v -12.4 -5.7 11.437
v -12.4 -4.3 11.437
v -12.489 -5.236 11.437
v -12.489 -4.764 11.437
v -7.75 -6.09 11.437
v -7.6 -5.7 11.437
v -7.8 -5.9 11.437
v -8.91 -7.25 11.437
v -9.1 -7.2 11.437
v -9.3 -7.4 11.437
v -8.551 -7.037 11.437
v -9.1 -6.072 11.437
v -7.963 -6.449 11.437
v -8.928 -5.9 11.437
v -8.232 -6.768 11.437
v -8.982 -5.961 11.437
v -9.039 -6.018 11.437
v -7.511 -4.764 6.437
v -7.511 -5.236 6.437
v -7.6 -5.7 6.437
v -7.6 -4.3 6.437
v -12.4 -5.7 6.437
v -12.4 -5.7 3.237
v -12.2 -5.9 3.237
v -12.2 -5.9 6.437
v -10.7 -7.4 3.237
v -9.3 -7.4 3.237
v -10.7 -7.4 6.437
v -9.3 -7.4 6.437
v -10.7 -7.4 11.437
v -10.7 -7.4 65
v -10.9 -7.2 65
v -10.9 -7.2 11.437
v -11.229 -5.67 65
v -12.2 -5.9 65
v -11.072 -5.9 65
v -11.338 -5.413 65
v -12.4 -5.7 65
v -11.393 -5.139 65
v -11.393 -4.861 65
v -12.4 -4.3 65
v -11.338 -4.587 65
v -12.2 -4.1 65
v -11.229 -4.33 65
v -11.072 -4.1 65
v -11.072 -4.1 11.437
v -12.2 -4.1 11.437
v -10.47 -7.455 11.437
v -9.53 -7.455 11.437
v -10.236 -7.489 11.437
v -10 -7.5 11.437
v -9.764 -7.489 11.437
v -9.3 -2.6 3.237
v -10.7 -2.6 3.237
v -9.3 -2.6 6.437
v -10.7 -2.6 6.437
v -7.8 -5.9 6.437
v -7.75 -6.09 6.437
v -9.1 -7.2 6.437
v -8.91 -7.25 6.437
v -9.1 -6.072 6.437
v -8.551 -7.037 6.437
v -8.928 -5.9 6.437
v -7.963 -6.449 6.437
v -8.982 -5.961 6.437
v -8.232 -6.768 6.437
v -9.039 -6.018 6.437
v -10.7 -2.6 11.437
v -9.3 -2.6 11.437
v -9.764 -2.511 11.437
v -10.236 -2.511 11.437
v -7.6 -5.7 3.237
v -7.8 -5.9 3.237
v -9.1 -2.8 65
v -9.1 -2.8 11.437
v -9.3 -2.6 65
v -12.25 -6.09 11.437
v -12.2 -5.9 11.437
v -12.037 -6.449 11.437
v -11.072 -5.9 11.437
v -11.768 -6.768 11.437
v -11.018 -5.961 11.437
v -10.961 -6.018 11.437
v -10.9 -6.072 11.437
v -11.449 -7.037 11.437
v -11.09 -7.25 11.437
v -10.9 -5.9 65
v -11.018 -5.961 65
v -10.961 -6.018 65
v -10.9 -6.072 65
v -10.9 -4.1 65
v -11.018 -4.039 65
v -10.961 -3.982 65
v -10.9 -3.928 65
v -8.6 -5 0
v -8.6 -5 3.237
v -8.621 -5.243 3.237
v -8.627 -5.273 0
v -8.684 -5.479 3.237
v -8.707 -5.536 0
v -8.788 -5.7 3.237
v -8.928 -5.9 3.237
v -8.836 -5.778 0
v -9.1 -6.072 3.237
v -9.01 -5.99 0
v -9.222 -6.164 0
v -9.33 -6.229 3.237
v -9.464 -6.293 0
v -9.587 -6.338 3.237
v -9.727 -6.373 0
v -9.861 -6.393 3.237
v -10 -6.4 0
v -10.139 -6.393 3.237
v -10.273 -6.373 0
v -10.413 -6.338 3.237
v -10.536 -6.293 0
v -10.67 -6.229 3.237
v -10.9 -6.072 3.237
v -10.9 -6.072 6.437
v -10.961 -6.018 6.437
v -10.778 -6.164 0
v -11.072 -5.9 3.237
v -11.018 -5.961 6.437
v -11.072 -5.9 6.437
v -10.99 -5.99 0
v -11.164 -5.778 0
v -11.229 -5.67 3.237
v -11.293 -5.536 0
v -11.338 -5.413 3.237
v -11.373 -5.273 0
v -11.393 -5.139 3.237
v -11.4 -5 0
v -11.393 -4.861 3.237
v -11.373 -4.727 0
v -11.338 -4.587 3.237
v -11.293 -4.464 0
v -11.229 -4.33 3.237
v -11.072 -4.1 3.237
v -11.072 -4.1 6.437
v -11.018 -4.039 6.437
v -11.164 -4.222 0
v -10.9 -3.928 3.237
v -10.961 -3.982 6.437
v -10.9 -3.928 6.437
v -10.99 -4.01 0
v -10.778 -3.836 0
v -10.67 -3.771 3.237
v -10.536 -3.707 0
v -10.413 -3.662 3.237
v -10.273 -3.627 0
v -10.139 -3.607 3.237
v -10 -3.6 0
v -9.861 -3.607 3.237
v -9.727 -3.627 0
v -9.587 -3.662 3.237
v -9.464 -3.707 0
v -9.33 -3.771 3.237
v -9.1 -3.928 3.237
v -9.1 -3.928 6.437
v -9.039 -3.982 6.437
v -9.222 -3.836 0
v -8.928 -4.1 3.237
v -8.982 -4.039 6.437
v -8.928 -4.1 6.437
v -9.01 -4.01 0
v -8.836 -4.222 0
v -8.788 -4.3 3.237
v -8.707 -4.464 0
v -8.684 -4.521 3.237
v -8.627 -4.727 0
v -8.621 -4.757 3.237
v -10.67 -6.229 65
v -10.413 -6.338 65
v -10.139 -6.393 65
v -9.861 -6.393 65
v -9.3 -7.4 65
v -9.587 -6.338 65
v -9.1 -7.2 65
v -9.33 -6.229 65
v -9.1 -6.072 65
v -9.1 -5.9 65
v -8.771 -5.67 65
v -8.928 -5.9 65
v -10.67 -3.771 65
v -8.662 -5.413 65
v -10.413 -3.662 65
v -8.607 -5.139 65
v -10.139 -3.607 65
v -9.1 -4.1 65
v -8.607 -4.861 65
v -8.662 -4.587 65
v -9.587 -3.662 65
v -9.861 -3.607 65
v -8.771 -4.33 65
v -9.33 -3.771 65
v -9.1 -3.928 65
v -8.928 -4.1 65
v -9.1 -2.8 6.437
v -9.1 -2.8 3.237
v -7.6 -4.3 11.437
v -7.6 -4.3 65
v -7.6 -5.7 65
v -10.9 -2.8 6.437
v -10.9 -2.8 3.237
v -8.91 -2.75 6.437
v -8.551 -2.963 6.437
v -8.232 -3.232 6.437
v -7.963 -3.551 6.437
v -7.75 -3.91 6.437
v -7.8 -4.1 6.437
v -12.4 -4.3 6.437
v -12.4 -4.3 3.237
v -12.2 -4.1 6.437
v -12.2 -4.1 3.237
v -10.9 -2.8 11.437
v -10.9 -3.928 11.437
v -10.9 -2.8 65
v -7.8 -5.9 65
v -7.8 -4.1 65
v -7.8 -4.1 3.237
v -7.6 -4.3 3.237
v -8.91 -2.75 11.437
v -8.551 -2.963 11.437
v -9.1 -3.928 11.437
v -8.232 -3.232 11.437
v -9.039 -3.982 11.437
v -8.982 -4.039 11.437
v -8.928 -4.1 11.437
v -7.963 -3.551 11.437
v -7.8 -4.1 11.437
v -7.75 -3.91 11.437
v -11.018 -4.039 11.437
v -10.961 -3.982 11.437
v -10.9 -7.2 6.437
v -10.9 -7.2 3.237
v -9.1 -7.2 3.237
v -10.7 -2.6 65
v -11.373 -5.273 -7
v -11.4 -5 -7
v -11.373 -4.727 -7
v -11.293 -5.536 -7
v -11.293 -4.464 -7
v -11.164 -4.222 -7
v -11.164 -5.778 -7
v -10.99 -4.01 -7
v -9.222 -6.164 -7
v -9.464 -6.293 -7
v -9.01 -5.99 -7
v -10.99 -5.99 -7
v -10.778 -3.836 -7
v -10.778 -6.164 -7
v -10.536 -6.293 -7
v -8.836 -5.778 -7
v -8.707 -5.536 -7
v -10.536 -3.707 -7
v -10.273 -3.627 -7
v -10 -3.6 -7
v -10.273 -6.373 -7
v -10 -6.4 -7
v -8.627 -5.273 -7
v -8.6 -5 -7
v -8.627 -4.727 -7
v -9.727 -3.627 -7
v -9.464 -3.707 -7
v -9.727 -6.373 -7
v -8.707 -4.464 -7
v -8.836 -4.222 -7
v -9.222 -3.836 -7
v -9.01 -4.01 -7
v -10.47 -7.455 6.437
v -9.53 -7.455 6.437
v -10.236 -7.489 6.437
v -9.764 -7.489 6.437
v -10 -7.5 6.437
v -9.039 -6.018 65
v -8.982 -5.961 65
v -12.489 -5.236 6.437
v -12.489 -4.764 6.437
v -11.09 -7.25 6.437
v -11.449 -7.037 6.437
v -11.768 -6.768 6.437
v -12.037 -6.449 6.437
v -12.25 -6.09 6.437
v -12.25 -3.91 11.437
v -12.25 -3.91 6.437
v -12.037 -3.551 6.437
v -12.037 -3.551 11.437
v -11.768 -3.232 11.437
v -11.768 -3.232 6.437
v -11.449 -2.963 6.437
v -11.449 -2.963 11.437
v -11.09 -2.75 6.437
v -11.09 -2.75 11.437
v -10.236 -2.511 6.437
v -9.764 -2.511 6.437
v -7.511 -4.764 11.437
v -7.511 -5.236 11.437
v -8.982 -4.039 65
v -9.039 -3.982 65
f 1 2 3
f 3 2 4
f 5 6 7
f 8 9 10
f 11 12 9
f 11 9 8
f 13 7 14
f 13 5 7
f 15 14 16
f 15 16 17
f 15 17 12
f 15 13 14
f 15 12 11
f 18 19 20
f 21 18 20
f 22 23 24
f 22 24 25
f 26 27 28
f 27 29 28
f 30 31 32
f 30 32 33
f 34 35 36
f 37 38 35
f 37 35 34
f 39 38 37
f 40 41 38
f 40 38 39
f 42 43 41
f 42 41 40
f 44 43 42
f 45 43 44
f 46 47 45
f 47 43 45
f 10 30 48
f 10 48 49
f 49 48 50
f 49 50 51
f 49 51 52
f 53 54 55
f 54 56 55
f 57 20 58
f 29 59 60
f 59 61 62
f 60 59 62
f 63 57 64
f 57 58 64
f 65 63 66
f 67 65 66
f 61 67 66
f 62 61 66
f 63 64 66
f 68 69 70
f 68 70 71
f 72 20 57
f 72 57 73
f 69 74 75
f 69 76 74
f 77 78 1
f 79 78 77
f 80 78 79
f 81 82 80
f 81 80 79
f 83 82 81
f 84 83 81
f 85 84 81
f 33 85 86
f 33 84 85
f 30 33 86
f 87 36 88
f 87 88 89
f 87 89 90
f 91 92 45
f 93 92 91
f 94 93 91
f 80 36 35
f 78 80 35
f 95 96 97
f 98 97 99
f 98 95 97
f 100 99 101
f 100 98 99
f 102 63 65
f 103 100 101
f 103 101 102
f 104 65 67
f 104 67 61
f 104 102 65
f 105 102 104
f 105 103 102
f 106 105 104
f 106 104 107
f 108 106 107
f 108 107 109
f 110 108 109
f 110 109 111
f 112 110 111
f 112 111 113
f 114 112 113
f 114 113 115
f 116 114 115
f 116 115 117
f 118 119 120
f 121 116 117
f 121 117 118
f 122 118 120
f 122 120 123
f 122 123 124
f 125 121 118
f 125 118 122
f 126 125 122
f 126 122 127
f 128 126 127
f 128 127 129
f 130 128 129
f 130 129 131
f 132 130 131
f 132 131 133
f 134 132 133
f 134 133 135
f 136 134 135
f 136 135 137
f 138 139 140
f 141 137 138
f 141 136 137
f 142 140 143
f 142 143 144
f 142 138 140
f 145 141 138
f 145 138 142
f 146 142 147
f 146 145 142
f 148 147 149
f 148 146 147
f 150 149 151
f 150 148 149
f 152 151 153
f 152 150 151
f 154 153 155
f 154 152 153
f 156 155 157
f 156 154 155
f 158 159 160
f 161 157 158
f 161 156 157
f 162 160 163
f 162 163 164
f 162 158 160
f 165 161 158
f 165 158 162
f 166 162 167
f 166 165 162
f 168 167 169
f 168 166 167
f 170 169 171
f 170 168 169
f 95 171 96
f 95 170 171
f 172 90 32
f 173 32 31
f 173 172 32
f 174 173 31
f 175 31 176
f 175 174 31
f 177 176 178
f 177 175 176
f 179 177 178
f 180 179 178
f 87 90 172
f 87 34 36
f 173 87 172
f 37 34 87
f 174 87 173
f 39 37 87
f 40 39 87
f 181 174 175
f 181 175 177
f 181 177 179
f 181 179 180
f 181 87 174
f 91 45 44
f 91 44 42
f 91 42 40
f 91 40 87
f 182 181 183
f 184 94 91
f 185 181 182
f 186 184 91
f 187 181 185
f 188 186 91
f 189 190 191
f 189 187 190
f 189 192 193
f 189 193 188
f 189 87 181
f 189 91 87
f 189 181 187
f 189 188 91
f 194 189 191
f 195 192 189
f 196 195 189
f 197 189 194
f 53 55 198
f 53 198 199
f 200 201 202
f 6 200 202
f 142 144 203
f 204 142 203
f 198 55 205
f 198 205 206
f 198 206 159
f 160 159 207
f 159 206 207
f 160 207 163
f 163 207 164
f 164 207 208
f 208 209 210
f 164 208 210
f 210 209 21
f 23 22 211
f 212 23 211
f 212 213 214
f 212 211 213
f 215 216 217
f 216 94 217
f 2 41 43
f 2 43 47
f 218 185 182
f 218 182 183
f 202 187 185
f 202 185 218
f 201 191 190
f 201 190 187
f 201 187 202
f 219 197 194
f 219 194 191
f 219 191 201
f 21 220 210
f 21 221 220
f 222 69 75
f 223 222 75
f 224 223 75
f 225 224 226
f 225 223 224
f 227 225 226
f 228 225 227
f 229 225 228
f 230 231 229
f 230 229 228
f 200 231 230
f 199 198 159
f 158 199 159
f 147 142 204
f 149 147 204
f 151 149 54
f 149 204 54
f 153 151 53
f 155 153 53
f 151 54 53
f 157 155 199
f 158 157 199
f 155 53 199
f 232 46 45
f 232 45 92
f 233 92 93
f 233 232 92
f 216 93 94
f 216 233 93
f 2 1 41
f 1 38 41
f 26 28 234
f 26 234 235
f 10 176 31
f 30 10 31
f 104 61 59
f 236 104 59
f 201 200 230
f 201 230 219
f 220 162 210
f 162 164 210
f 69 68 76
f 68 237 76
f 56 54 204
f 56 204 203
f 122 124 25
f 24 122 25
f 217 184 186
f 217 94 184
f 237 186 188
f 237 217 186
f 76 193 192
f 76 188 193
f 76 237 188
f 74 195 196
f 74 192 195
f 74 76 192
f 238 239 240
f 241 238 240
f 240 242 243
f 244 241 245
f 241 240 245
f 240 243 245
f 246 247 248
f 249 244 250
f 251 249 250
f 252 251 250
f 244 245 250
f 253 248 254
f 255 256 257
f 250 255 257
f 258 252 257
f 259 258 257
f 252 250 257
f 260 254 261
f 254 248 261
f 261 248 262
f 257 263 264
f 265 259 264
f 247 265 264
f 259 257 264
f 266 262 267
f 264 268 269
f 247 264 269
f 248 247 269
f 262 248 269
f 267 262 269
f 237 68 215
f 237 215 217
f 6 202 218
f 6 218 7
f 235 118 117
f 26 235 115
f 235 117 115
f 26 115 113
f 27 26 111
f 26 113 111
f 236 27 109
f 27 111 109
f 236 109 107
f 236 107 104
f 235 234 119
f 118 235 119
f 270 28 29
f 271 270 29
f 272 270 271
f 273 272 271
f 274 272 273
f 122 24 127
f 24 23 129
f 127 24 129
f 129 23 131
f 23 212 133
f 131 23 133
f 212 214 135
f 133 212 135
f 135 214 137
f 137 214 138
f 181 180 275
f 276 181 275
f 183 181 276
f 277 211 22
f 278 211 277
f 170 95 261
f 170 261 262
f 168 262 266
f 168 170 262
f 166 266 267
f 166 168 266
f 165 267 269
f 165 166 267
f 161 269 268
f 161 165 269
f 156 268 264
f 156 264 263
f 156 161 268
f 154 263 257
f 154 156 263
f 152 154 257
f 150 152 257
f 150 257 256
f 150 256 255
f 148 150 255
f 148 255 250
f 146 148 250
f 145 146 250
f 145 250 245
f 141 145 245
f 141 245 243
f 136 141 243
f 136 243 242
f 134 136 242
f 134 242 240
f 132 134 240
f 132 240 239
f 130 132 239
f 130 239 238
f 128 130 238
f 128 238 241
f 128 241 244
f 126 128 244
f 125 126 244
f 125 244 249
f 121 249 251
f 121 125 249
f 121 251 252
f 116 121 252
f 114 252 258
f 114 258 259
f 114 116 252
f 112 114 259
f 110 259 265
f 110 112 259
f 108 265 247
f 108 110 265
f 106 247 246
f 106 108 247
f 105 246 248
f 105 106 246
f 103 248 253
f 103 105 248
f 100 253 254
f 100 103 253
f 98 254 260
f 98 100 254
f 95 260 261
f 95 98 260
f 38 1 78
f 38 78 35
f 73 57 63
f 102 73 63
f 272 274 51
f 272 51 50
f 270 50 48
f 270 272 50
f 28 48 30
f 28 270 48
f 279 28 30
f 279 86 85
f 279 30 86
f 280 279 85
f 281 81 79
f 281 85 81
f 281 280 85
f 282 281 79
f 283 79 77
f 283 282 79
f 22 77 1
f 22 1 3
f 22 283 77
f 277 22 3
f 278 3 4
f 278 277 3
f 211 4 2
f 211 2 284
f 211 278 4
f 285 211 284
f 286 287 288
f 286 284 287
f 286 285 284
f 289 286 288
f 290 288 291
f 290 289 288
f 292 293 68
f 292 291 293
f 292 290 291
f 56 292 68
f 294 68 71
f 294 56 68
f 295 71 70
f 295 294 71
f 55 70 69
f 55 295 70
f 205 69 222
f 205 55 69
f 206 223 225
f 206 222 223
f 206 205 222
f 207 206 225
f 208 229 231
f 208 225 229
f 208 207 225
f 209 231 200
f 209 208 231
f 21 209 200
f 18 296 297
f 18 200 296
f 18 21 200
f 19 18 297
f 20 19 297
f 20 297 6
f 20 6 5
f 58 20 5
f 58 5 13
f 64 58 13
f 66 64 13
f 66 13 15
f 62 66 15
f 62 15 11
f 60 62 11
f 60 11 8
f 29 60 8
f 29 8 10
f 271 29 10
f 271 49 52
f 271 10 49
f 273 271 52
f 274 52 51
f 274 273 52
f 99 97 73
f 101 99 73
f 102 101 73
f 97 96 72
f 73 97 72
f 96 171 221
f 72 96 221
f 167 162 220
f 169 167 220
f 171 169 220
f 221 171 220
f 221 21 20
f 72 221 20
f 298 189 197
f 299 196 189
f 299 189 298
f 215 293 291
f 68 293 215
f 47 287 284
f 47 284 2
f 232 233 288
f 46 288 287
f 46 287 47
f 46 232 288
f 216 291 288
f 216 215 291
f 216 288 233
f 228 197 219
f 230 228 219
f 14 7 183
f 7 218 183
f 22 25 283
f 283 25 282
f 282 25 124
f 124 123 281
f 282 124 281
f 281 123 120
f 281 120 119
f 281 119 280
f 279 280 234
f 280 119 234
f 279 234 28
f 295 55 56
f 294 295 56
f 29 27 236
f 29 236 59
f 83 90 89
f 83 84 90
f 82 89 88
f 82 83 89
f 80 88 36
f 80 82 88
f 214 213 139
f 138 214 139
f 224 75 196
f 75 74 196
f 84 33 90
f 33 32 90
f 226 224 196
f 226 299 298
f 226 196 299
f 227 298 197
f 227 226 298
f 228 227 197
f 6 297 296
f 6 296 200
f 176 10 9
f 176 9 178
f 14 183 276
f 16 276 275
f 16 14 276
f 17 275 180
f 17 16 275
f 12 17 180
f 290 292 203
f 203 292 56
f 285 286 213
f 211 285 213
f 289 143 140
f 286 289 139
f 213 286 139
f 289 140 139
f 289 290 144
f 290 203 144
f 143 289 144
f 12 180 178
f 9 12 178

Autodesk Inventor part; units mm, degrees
ref_plane "Plano de trabajo1" through (0, 0, 0) normal (0, 0, 1) x (1, 0, 0)
sketch "Boceto1" plane through (0, 0, 0) normal (0, 0, 1) x (1, 0, 0)
  circle A0 centre (-10, -5) radius 1.4
  point P0 (0, 0)
  dimension "d0" = 2.8
extrude "Extrusión1" add sketch "Boceto1" along normal blind 65 and the other way blind 7
sketch "Boceto3" plane through (-10, -5, 65) normal (0, 0, 1) x (1, 0, 0)
  line L0 (-2.4, 0.9) -> (2.4, 0.9)
  line L1 (2.4, 0.9) -> (2.4, -0.9)
  line L2 (2.4, -0.9) -> (-2.4, -0.9)
  line L3 (-2.4, -0.9) -> (-2.4, 0.9)
  line L4 (-2.4, 0.9) -> (2.4, -0.9) construction
  line L5 (2.4, 0.9) -> (-2.4, -0.9) construction
  circle A0 centre (0, 0) radius 1.4 projected
  line L6 (-0.9, 2.4) -> (0.9, 2.4)
  line L7 (0.9, 2.4) -> (0.9, -2.4)
  line L8 (0.9, -2.4) -> (-0.9, -2.4)
  line L9 (-0.9, -2.4) -> (-0.9, 2.4)
  line L10 (-0.9, 2.4) -> (0.9, -2.4) construction
  line L11 (0.9, 2.4) -> (-0.9, -2.4) construction
  point P0 (10, 5)
  point P1 (0.9, 0.9)
  point P2 (-0.9, 0.9)
  point P3 (-0.9, -0.9)
  point P4 (0.9, -0.9)
  dimension "d11" = 4.8
  dimension "d12" = 1.8
ref_plane "Plano de trabajo2" through (-27.5, -25, 0) normal (0, 0, 1) x (1, 0, 0)
ref_plane "Plano de trabajo4" through (-27.5, -25, 3.2373) normal (0, 0, 1) x (1, 0, 0)
extrude "Extrusión3" add sketch "Boceto3" against normal up to surface (61.7627 mm away) contours L0 A0 L2 L3 | L0 L9 L2 A0 | L9 A0 L7 L0 | L0 L7 L2 L9 | L9 L6 L7 A0 | L0 A0 L2 L7 | L2 L7 A0 L9 | A0 L7 L8 L9 | L0 L1 L2 A0
chamfer "Chaflán1" distance 0.2 angle 45 8 edges at (-7.6, -4.1, 34.1186) (-7.6, -5.9, 34.1186) (-9.1, -7.4, 34.1186) (-10.9, -7.4, 34.1186) (-12.4, -5.9, 34.1186) (-12.4, -4.1, 34.1186) (-10.9, -2.6, 34.1186) (-9.1, -2.6, 34.1186)
ref_plane "Plano de trabajo3" through (-10, -5, 3) normal (0, 0, 1) x (0, -1, 0)
ref_plane "Plano de trabajo5" through (-22.3692, -98.1544, 6.2373) normal (0, 0, 1) x (1, 0, 0)
ref_plane "Plano de trabajo6" through (-22.3692, -98.1544, 6.2373) normal (0, 0, 1) x (1, 0, 0)
ref_plane "Plano de trabajo7" through (-10, -5, 6.4373) normal (0, 0, 1) x (0, -1, 0)
sketch "Boceto4" plane through (-10, -5, 3) normal (0, 0, 1) x (0, -1, 0)
  circle A0 centre (0, 0) radius 2.5
  point P0 (-5, 10)
  point P1 (-1.2041, 2.1909)
  dimension "d20" = 5
extrude "Extrusión4" add sketch "Boceto4" along normal blind 5 from surface at 3.4373
properties part number "EjecilindroGarraSTD"
